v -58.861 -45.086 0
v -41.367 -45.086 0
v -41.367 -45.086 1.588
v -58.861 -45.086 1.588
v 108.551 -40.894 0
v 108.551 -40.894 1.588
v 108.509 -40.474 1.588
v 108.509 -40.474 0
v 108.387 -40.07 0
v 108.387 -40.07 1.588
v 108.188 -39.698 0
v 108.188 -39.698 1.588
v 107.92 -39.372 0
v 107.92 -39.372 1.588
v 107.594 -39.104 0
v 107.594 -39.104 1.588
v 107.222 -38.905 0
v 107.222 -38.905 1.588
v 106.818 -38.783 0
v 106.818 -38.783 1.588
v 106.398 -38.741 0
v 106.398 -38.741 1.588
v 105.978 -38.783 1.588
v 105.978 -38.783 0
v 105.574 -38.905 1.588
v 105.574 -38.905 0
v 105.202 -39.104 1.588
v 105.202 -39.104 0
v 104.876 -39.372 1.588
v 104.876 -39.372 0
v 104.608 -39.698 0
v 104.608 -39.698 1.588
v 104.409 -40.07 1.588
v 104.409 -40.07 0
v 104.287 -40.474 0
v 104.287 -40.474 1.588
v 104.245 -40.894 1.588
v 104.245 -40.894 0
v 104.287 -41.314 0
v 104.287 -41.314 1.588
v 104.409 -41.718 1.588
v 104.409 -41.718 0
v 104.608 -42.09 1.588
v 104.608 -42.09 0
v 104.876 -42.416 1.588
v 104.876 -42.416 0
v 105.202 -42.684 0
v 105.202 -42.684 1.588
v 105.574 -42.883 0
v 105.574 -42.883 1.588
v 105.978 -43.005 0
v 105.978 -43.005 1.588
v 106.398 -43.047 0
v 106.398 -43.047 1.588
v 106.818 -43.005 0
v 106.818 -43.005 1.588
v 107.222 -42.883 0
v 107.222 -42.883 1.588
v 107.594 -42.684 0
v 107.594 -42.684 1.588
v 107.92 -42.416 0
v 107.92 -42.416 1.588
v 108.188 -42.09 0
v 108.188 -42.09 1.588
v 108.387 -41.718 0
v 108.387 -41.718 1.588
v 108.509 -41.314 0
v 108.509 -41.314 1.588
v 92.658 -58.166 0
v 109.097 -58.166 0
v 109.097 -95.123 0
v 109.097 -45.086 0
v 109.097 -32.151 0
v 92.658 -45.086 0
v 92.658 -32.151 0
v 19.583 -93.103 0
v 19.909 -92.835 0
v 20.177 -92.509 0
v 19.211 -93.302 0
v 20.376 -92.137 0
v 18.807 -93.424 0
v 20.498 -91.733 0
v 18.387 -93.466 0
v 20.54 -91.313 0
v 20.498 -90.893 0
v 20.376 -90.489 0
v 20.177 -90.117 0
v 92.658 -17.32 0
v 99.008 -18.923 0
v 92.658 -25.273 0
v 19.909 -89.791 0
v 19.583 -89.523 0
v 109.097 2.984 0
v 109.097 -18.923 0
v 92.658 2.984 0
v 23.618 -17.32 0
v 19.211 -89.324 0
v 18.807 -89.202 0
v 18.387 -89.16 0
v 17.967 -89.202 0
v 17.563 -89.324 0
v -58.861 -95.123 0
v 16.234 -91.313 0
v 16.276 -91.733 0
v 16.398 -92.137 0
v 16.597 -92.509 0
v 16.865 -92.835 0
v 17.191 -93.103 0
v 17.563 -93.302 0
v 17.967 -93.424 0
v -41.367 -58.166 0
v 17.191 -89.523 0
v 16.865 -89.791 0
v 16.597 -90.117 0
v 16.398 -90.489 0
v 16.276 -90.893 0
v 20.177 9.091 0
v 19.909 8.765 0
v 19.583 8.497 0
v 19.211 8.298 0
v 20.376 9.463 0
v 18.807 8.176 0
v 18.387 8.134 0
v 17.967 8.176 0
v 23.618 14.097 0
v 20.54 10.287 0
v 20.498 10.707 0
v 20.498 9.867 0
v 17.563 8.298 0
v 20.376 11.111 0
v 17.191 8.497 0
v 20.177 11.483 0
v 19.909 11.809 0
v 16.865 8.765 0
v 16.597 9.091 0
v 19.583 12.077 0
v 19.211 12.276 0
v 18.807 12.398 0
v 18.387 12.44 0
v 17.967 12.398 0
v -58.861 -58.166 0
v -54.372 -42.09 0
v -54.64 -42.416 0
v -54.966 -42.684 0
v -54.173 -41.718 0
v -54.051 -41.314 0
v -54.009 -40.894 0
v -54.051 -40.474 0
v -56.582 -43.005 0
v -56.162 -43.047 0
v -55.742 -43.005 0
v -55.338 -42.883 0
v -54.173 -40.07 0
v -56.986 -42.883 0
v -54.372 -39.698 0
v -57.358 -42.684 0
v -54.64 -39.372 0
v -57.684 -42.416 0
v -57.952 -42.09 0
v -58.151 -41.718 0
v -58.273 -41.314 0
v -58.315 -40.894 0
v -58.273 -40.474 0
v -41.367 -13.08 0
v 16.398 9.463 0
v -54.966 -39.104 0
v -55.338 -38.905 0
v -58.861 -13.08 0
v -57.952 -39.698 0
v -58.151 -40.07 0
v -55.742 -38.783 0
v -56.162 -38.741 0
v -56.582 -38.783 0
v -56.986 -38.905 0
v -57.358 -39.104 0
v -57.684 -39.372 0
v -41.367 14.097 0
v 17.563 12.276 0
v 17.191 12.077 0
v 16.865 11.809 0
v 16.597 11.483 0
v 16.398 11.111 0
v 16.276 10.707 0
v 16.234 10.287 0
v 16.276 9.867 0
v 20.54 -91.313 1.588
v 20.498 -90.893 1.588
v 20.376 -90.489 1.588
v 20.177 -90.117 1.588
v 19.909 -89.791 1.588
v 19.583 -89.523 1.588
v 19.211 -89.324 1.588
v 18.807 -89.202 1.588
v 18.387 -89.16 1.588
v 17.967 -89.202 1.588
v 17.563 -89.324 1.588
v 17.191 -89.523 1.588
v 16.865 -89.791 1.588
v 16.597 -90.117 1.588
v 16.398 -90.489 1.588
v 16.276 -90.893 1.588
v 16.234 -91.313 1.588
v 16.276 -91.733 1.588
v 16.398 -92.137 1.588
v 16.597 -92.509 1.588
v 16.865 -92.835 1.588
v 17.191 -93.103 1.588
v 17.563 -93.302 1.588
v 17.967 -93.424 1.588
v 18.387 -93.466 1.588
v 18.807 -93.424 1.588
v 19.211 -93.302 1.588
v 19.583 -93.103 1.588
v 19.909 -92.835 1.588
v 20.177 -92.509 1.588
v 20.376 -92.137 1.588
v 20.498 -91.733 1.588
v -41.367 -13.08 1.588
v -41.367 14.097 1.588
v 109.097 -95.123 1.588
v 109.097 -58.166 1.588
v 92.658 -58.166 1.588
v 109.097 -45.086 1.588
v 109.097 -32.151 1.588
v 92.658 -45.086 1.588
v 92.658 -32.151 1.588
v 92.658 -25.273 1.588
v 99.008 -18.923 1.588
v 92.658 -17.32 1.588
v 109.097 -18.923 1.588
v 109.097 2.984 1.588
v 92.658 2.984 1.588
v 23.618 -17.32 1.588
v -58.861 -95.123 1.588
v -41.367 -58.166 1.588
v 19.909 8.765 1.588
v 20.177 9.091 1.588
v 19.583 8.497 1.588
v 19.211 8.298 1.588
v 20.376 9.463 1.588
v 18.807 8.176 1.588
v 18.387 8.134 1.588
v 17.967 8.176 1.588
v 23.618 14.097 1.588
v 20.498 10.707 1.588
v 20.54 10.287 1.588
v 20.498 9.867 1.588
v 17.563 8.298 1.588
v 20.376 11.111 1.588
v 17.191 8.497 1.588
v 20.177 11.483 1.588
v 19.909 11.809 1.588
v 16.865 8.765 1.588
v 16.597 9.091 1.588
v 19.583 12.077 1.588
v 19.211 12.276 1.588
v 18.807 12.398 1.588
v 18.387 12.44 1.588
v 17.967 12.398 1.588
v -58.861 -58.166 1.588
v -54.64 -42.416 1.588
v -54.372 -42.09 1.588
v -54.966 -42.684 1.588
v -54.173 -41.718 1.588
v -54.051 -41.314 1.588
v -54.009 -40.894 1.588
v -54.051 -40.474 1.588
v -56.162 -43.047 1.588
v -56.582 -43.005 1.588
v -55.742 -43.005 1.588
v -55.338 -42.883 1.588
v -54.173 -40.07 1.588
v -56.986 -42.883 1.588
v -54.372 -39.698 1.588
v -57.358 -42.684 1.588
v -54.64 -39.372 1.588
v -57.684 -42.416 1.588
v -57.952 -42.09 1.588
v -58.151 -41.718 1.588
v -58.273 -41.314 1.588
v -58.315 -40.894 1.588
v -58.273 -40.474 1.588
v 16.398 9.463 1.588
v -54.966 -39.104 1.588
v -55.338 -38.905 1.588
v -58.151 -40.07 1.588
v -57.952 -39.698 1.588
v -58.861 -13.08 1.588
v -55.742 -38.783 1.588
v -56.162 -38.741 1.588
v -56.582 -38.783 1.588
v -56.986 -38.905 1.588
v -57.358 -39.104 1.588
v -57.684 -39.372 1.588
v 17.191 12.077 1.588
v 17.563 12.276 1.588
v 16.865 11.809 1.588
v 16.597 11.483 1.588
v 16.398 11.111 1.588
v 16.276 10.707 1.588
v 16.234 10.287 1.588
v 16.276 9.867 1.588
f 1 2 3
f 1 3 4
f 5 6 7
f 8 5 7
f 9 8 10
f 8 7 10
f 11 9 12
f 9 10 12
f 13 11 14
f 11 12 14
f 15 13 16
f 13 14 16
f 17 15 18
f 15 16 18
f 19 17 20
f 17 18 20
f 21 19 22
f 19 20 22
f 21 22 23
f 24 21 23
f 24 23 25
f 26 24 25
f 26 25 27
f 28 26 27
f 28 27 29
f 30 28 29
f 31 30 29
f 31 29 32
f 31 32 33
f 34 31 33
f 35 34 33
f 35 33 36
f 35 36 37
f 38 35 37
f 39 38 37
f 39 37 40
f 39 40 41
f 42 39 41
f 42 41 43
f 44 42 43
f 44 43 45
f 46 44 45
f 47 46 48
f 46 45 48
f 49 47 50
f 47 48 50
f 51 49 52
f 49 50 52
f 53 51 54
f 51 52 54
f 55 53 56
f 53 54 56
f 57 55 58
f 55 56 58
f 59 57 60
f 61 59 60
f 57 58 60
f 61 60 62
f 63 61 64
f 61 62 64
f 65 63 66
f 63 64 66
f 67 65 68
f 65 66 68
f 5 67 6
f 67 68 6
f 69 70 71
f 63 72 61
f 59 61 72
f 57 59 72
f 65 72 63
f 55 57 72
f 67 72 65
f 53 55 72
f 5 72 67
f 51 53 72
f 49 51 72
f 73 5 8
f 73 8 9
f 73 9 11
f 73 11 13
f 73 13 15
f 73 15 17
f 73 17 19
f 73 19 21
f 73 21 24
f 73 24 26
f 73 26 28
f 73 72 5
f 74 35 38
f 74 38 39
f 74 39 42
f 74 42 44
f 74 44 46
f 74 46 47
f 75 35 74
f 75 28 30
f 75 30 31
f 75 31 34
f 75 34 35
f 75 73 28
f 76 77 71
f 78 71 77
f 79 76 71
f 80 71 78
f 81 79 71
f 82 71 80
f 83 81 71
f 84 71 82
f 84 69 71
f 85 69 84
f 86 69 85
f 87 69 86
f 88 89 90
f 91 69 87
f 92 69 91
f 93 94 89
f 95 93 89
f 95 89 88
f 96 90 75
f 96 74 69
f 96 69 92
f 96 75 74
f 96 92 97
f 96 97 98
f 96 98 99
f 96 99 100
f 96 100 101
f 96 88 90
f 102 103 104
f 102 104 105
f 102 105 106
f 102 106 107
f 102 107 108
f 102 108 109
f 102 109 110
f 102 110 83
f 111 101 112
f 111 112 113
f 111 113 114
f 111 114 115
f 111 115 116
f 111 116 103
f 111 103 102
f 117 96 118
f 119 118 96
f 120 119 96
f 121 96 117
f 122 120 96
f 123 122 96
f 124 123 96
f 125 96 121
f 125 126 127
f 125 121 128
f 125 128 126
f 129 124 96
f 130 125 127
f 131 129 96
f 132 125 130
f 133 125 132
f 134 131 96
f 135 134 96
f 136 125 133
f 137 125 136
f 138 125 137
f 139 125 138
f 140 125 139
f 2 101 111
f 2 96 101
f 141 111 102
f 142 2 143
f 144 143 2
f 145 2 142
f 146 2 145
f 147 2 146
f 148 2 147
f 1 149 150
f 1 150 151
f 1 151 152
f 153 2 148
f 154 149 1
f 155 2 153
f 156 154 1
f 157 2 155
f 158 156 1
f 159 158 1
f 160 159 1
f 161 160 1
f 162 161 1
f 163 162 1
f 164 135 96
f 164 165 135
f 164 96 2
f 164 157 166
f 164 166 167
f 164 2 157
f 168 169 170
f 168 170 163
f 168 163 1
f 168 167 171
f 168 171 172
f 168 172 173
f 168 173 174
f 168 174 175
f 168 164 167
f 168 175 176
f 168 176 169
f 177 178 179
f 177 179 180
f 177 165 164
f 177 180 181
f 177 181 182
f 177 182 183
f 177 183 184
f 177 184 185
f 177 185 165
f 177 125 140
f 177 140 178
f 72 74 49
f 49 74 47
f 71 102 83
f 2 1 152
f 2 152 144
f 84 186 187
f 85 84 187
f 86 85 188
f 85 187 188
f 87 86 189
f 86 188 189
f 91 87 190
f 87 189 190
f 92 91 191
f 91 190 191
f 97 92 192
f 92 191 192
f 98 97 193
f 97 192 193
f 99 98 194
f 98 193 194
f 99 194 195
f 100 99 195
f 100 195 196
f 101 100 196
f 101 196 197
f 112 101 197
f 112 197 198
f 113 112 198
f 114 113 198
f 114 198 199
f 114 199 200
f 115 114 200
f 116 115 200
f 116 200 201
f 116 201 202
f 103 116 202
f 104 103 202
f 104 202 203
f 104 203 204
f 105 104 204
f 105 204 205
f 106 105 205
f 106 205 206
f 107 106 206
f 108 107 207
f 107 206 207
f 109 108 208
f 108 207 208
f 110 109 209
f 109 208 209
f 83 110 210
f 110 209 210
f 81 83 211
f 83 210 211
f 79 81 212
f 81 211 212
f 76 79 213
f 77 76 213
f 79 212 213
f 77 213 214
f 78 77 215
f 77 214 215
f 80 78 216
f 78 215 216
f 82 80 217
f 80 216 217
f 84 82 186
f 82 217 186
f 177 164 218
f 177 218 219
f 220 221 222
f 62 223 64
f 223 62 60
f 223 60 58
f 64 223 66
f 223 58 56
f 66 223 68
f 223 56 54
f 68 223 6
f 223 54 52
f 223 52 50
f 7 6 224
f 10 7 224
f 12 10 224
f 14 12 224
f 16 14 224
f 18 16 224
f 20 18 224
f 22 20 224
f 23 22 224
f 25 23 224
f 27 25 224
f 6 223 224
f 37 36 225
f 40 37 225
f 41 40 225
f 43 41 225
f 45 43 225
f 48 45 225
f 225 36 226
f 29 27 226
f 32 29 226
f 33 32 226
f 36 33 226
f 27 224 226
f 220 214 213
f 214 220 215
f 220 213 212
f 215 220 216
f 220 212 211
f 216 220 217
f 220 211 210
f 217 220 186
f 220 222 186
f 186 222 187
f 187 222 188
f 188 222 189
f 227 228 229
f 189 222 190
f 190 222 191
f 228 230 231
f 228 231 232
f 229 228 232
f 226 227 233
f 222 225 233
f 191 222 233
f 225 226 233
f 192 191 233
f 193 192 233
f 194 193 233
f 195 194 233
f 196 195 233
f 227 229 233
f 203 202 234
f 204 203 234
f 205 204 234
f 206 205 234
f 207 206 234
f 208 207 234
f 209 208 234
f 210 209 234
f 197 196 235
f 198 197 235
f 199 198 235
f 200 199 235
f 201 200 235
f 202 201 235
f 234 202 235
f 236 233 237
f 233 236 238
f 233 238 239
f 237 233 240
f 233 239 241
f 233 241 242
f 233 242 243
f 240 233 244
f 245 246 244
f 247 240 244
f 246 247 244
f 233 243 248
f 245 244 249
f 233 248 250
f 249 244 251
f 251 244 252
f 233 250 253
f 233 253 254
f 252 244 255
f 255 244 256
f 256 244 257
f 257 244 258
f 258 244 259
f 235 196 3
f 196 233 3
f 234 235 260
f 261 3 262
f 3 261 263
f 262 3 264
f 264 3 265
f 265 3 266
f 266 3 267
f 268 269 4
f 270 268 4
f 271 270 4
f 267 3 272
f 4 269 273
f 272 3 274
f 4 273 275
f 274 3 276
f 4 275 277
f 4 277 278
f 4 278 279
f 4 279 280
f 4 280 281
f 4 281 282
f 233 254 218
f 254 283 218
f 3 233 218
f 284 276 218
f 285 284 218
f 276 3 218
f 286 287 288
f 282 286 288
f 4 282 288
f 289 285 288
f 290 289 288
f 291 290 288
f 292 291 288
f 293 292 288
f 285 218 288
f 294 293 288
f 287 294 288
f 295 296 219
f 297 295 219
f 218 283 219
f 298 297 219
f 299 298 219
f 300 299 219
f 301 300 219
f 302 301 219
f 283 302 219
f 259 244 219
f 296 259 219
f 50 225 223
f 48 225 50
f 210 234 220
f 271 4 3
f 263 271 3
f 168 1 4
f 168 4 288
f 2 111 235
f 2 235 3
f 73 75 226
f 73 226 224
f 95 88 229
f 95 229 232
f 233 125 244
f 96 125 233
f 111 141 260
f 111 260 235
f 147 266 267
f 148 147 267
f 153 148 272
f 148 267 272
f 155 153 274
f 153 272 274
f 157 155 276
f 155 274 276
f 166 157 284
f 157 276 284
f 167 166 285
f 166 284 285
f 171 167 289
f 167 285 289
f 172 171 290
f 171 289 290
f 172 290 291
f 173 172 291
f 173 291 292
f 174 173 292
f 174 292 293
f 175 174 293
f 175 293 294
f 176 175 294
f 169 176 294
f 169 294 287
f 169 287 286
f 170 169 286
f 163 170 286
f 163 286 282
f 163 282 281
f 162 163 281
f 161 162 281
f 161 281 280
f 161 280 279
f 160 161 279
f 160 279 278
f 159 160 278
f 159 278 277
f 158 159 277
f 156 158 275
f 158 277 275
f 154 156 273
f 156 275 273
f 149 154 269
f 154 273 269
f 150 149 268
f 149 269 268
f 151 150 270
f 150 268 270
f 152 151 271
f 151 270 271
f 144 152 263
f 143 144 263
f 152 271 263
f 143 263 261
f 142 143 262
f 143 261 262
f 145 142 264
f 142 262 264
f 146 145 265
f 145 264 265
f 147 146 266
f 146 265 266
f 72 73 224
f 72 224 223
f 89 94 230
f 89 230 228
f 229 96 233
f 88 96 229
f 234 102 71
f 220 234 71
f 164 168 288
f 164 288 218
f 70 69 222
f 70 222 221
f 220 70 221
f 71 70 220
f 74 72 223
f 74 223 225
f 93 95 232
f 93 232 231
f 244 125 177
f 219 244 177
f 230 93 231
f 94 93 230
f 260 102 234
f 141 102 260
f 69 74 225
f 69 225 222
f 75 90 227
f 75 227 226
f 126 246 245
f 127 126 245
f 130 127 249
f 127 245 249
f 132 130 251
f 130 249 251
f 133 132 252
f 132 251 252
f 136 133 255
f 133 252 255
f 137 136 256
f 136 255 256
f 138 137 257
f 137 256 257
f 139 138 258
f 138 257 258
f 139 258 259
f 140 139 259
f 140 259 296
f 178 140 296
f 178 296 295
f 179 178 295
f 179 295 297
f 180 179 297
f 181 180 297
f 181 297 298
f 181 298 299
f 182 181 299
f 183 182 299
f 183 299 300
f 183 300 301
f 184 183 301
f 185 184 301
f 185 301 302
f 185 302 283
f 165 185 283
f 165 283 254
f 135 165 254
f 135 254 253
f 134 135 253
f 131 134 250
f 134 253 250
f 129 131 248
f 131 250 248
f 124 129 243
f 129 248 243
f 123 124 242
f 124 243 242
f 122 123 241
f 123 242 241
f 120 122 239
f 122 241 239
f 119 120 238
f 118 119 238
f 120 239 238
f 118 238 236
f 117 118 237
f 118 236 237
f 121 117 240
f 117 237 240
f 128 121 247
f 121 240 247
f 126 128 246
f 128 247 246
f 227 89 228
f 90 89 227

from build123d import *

# Parameters (mm, degrees)
BOSS_EXTRUDE1_DEPTH   = 1.5875
F_6_CLEARANCE_HOLE1_D = 4.3053


with BuildPart() as part:
    # Sketch1 → Boss-Extrude1 (new body)
    with BuildSketch(Plane.XY):
        Polygon((-41.367, 14.097), (6.663436815, 14.097), (23.618, 14.097), (23.618, -17.32), (92.658, -17.32), (92.658, 2.9845), (109.09675, 2.9845), (109.09675, -18.923), (99.008, -18.923), (92.658, -25.273), (92.658, -32.150898303), (109.09675, -32.150898303), (109.09675, -45.0855), (92.658, -45.0855), (92.658, -58.1655), (109.09675, -58.1655), (109.09675, -95.123), (90.082920323, -95.123), (9.878, -95.123), (-38.028966768, -95.123), (-58.86075, -95.123), (-58.86075, -58.1655), (-41.367, -58.1655), (-41.367, -45.0855), (-58.86075, -45.0855), (-58.86075, -13.0805), (-41.367, -13.0805), align=None)
    extrude(amount=BOSS_EXTRUDE1_DEPTH)

    # #6 Clearance Hole1 (through all)
    with Locations(Plane(origin=(0, 0, 0), x_dir=(-1, 0, 0), z_dir=(0, 0, -1))):
        with Locations((-106.398, -40.894), (-18.387, 10.287), (56.162, -40.894), (-18.387, -91.313)):
            Hole(F_6_CLEARANCE_HOLE1_D / 2)


solid = part.part
